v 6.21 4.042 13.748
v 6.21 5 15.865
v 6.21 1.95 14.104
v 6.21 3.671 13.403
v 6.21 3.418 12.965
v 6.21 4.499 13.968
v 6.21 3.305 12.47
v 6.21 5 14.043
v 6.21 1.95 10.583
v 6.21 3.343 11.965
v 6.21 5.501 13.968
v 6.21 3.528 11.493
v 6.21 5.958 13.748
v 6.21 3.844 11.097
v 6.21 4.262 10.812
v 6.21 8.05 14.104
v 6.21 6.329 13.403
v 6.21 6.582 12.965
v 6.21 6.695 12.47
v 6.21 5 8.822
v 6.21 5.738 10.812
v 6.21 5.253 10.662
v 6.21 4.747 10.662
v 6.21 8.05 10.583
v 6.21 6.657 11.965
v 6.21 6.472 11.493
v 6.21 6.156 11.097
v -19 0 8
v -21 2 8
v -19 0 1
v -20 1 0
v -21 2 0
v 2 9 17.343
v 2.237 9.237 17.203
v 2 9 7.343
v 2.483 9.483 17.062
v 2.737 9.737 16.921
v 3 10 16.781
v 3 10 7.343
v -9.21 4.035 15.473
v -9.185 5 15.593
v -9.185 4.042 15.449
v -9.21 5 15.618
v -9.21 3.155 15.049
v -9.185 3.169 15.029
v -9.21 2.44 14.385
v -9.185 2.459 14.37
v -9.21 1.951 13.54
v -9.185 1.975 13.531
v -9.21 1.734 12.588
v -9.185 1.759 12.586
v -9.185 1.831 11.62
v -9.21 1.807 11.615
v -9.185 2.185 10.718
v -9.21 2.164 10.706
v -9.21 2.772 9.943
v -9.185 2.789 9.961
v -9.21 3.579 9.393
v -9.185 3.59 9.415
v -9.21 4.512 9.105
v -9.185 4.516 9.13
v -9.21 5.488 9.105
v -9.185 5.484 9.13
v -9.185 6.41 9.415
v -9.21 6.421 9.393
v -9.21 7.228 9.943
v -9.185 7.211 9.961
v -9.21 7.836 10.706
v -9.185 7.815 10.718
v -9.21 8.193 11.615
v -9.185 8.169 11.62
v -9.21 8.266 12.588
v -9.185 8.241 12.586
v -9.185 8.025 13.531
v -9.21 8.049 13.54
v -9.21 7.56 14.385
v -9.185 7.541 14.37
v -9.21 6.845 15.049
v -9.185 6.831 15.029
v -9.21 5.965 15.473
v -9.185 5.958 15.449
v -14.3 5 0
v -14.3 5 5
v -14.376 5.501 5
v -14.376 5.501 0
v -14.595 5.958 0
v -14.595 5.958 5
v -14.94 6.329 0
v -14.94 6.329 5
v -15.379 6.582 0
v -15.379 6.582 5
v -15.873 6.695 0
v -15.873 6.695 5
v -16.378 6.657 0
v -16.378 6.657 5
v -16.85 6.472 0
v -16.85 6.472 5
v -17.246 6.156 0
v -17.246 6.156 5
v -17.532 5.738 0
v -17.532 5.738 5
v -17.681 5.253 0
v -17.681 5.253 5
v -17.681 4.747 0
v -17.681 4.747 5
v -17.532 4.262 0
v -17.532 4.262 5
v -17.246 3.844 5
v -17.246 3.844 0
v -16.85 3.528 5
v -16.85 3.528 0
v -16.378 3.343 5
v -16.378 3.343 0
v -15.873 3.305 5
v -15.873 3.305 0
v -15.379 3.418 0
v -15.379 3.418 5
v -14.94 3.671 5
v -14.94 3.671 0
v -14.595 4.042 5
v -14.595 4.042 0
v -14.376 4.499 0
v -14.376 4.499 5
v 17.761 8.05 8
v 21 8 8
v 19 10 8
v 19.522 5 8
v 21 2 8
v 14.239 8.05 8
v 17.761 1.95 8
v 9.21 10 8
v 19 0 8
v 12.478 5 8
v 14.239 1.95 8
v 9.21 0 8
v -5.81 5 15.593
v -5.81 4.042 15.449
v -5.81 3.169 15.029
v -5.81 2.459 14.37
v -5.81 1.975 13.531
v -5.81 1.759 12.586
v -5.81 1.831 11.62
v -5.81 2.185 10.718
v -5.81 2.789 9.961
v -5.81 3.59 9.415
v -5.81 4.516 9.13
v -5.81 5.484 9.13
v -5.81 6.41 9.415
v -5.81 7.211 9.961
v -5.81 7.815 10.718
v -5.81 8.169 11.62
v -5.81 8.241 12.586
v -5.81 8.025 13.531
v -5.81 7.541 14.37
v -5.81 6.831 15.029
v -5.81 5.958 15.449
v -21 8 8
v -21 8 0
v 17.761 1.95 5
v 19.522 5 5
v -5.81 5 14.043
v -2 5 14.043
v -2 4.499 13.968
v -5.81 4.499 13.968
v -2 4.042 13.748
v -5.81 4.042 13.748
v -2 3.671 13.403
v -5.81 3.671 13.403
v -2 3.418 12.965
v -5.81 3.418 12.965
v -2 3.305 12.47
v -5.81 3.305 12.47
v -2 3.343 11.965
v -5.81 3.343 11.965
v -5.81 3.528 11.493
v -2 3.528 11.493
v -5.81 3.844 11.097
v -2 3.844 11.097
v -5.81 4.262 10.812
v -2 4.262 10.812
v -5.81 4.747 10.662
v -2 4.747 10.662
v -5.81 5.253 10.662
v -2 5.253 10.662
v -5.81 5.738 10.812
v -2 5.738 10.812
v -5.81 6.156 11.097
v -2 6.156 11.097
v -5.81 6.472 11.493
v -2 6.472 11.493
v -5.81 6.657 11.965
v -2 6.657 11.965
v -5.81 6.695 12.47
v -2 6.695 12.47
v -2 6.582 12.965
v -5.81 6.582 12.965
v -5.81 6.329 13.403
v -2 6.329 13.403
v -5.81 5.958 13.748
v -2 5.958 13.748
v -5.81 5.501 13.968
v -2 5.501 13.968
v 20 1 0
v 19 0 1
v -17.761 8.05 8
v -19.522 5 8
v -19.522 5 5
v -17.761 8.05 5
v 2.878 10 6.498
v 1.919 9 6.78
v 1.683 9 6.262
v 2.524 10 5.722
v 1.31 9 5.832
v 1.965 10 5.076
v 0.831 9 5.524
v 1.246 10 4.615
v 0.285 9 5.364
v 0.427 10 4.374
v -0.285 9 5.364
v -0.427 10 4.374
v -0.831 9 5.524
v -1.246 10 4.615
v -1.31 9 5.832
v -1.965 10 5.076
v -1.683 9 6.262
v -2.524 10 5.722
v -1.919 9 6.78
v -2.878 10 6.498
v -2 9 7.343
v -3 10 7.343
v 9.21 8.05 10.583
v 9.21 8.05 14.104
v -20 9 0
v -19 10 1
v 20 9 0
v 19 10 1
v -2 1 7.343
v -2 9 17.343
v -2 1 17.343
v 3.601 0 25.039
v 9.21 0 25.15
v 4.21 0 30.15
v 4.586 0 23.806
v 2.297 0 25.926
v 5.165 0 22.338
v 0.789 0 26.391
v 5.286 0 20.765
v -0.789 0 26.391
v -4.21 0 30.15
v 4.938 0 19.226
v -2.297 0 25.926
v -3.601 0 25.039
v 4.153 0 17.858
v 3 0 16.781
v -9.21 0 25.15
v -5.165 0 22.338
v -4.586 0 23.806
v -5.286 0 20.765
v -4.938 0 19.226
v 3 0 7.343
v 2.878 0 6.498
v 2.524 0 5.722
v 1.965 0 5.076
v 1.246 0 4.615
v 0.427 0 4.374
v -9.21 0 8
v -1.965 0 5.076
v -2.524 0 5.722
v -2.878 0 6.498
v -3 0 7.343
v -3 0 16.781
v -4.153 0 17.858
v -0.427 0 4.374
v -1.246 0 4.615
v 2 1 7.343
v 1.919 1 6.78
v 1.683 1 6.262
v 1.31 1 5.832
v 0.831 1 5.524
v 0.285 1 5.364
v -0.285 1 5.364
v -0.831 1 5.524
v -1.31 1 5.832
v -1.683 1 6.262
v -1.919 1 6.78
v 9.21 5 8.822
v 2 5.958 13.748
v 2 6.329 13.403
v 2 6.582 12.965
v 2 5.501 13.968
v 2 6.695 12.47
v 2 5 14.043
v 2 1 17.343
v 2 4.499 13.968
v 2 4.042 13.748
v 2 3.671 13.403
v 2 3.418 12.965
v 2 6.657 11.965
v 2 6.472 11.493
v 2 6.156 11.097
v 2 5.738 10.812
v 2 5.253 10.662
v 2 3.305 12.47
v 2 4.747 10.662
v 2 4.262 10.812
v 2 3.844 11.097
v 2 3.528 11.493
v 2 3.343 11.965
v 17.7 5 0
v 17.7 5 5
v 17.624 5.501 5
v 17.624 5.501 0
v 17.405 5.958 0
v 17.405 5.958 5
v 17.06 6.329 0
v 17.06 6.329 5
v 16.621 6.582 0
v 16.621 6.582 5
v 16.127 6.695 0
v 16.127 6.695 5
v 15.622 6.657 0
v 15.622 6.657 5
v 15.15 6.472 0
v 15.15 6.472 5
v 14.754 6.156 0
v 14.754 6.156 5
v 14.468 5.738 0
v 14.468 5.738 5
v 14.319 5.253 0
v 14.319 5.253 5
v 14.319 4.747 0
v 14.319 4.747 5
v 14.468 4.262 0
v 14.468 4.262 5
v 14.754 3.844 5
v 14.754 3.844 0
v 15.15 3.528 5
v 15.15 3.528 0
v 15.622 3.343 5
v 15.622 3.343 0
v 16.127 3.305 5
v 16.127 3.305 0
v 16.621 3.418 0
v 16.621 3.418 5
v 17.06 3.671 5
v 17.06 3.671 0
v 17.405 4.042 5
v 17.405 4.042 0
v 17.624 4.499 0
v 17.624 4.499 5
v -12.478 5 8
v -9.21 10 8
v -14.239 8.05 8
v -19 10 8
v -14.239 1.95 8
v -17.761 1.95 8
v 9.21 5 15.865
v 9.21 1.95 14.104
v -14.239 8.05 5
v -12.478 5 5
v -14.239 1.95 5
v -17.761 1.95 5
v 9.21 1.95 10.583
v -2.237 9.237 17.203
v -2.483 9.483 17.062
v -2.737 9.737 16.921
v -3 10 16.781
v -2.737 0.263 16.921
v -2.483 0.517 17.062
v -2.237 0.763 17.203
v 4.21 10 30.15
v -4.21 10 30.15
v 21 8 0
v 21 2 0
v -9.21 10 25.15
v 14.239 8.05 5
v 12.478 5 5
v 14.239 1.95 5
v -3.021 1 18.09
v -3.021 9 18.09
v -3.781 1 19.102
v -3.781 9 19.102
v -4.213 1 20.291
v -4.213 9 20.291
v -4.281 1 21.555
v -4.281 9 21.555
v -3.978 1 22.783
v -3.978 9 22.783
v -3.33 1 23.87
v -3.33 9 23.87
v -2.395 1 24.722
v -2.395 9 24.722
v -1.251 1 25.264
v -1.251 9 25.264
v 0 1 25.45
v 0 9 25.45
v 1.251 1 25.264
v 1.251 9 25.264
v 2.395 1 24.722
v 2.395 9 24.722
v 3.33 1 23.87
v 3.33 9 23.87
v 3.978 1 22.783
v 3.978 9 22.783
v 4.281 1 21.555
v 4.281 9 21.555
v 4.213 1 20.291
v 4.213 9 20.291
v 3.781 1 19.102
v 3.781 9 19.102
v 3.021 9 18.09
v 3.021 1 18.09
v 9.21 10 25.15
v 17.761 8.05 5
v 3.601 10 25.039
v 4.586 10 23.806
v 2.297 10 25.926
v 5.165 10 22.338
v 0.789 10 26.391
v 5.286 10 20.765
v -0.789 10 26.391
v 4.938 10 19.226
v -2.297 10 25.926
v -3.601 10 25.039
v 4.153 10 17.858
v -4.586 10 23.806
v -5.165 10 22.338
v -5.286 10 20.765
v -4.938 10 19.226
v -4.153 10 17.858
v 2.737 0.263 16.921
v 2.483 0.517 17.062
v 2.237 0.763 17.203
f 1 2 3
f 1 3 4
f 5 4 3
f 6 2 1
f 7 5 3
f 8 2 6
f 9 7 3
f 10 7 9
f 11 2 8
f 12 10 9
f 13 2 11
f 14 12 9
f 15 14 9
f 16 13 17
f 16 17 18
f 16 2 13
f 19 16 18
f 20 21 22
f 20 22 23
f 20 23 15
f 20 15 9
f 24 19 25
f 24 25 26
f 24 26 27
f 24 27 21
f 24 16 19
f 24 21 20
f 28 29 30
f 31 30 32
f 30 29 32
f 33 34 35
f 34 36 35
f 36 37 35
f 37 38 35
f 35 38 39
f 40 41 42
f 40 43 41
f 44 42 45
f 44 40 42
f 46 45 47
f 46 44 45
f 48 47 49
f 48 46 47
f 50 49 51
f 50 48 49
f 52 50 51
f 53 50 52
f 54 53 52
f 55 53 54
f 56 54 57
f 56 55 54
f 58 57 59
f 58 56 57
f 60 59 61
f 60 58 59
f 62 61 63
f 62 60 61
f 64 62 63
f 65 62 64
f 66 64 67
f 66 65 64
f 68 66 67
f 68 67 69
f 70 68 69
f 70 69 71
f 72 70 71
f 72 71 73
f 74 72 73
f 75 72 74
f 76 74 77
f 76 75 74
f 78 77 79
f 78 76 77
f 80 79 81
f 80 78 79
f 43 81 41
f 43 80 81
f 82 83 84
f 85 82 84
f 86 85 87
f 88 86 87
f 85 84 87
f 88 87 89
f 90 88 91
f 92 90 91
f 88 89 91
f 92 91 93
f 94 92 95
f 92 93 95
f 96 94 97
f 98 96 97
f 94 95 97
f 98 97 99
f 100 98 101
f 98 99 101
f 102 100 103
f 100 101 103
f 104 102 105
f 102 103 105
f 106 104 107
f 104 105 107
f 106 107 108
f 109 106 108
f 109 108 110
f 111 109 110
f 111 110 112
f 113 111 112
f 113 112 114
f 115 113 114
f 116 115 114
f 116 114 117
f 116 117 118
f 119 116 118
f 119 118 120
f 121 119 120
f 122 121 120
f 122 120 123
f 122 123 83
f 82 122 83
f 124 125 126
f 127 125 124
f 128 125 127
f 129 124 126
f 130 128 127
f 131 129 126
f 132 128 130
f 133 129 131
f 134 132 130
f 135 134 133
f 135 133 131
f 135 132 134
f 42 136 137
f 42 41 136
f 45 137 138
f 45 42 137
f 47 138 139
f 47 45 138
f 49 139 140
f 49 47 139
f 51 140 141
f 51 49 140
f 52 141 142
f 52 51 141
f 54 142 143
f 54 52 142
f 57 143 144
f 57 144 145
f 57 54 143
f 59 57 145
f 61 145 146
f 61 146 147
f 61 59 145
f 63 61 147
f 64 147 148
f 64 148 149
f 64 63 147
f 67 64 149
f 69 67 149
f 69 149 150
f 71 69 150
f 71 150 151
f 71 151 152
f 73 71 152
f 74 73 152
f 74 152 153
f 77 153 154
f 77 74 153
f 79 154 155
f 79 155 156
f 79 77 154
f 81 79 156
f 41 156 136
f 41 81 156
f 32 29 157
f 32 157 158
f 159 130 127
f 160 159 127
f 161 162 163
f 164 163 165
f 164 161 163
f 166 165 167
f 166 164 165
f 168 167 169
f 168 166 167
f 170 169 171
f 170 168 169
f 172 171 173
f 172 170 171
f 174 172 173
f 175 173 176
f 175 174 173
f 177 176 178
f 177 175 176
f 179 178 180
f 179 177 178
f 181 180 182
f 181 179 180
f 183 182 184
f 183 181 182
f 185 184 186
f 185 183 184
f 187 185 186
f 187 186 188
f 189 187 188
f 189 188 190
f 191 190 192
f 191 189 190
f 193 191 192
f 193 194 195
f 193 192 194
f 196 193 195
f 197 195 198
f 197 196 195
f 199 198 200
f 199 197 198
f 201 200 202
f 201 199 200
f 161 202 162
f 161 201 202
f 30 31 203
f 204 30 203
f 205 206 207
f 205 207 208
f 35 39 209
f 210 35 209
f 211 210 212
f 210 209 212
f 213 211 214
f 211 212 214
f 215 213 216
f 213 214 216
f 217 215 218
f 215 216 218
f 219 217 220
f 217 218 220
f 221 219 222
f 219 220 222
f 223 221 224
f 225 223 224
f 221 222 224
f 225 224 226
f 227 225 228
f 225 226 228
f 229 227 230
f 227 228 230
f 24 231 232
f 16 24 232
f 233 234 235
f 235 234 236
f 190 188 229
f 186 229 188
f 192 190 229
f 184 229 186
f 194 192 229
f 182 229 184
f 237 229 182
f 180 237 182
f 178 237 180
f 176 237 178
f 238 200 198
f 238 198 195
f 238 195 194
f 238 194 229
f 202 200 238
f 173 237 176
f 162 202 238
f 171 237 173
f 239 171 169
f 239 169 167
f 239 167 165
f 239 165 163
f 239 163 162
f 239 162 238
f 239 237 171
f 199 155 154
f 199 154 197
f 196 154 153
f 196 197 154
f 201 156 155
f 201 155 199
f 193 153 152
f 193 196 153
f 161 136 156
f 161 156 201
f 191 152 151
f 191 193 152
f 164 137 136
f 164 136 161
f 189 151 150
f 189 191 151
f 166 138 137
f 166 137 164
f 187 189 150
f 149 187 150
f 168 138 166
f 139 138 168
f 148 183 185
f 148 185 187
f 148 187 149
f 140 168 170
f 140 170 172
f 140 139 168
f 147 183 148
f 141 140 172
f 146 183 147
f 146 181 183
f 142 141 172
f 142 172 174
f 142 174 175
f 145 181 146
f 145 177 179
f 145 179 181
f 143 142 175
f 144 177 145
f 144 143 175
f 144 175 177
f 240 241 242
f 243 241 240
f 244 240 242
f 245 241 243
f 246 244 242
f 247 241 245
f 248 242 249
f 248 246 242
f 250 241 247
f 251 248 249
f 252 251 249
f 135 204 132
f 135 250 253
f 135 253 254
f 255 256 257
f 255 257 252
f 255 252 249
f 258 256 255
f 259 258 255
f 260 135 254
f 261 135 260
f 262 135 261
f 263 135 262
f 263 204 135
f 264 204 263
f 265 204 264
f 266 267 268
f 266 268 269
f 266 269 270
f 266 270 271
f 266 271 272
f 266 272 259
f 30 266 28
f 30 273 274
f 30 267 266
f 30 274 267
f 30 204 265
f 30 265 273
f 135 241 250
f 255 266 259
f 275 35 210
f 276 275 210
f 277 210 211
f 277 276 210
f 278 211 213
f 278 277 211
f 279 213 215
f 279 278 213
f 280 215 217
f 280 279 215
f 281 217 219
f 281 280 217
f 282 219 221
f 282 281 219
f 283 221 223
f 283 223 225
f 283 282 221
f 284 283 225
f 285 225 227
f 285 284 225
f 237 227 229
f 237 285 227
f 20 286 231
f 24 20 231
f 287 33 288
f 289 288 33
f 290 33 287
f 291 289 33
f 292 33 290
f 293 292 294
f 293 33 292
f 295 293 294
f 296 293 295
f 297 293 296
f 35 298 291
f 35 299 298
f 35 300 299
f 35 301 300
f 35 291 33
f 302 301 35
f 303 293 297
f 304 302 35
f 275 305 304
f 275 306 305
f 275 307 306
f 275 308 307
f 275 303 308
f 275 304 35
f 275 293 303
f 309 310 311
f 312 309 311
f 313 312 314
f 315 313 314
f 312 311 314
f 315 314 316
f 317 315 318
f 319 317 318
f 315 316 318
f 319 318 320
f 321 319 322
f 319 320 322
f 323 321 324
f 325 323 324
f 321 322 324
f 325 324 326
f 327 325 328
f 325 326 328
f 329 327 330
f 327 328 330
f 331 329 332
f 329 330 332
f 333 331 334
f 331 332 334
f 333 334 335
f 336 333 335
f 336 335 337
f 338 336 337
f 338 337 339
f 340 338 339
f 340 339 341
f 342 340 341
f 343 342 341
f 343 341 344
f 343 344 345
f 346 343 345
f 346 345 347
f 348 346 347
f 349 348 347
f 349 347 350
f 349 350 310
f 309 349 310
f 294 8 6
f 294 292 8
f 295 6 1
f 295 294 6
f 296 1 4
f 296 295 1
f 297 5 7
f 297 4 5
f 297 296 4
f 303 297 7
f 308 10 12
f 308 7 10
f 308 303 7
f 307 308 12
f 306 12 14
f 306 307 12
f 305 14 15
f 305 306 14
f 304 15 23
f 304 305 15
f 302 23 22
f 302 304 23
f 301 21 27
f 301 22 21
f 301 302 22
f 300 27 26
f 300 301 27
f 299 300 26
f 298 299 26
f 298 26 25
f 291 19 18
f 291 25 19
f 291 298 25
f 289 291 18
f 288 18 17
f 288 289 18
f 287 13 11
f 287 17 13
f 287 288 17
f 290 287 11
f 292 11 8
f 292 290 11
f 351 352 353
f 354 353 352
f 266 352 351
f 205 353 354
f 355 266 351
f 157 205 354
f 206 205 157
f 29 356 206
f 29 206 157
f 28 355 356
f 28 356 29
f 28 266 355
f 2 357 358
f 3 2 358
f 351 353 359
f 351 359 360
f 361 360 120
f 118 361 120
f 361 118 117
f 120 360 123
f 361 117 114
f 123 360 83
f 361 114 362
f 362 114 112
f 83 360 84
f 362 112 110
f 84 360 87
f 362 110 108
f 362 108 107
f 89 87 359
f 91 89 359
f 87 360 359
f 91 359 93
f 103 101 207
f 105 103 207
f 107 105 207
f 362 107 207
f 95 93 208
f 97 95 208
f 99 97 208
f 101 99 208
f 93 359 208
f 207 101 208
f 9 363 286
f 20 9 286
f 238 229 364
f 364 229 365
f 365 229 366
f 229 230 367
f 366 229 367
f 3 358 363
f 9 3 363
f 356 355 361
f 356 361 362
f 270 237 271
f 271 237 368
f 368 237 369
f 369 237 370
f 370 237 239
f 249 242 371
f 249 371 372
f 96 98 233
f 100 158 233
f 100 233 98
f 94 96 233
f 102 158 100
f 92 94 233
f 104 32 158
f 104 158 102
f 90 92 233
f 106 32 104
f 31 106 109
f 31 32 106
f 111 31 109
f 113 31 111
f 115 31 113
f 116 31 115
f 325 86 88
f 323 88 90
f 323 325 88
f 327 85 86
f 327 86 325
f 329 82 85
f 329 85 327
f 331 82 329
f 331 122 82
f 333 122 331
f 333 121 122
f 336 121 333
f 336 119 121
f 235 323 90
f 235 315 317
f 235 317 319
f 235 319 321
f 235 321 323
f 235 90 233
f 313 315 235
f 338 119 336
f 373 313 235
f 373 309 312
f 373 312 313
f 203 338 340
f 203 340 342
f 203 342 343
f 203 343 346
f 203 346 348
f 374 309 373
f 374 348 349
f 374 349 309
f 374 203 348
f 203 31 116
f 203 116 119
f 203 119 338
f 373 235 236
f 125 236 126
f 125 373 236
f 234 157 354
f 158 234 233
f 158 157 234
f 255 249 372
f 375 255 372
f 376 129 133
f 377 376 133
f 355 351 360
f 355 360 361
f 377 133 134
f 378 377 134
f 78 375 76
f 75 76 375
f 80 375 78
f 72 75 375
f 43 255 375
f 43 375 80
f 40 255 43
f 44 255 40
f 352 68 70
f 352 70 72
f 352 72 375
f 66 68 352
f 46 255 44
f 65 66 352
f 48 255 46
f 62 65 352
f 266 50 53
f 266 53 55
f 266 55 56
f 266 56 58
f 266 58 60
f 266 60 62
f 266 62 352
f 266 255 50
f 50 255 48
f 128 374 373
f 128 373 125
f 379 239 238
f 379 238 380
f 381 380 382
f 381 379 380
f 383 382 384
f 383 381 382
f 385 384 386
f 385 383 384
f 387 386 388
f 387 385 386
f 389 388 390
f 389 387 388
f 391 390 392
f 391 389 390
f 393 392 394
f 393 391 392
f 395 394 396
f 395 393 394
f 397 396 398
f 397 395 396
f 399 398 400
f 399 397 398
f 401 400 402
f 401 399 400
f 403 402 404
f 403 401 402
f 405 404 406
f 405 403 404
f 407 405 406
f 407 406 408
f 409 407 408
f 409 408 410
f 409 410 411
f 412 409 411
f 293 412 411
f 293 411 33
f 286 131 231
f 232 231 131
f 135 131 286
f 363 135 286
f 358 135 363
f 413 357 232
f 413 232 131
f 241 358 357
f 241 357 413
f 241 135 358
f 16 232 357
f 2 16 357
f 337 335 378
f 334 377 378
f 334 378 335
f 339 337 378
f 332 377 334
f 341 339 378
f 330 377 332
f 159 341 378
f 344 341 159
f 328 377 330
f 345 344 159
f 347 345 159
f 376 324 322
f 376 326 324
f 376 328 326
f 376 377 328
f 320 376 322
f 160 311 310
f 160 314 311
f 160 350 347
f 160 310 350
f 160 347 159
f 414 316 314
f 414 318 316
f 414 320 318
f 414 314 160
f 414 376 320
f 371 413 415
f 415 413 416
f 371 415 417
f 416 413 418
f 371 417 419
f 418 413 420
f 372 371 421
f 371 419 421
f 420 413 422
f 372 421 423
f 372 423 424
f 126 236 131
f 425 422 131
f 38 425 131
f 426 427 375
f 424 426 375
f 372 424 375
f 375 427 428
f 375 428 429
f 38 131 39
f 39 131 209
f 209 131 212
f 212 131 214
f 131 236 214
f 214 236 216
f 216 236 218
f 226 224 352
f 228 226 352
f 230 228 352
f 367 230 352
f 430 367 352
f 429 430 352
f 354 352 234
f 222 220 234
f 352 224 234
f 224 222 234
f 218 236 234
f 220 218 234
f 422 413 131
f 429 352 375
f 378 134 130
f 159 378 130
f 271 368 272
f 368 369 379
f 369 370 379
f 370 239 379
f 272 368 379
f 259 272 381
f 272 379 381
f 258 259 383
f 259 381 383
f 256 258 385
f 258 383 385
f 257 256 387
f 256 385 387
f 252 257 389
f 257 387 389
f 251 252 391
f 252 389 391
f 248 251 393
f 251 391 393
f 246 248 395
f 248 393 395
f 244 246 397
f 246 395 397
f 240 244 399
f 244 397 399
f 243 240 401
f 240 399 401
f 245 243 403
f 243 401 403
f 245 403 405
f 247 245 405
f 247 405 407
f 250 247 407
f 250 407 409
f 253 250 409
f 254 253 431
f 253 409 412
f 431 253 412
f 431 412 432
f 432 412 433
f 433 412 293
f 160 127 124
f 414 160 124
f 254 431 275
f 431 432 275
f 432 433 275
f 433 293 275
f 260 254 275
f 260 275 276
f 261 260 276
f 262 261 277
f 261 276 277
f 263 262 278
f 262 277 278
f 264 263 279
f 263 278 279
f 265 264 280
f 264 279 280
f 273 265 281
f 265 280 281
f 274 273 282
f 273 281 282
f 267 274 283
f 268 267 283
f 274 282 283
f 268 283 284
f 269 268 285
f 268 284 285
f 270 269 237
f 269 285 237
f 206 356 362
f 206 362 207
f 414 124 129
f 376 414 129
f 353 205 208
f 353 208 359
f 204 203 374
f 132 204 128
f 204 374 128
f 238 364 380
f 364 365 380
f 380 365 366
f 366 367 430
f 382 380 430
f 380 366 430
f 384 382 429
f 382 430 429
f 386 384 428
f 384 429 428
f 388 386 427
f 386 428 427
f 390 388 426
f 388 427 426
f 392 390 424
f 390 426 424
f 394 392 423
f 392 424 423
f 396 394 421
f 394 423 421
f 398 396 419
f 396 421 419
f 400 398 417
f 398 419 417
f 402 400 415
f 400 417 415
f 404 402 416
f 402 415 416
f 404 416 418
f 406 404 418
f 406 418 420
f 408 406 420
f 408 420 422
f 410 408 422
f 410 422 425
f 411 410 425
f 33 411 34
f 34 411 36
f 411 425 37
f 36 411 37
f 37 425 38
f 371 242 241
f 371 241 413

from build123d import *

# Parameters (mm, degrees)
BOSS_EXTRUDE1_DEPTH  = 10
CHAMFER1_SIZE        = 5
CHAMFER2_SIZE        = 2
CHAMFER3_SIZE        = 1
CUT_EXTRUDE1_DEPTH   = 3
M3_CLEARANCE_HOLE1_D = 3.4
CUT_EXTRUDE2_DEPTH   = 3


with BuildPart() as part:
    # Sketch1 → Boss-Extrude1 (new body)
    with BuildSketch(Plane(origin=(0, 0, 0), x_dir=(1, 0, 0), z_dir=(0, 1, 0))):
        Polygon((-21, 0), (21, 0), (21, -8), (9.21, -8), (9.21, -30.15), (-9.21, -30.15), (-9.21, -8), (-21, -8), align=None)
        with BuildLine():
            Line((-2, -7.343426738), (-2, -17.343426738))
            ThreePointArc((-2, -17.343426738), (0, -25.45), (2, -17.343426738))
            Line((2, -17.343426738), (2, -7.343426738))
            ThreePointArc((2, -7.343426738), (0, -5.343426738), (-2, -7.343426738))
        make_face(mode=Mode.SUBTRACT)
    extrude(amount=BOSS_EXTRUDE1_DEPTH)

    # Chamfer1
    chamfer1_edges = [part.edges().sort_by_distance(p)[0] for p in [
        (9.21, 5, 30.15),
        (-9.21, 5, 30.15),
    ]]
    chamfer(chamfer1_edges, length=CHAMFER1_SIZE)

    # Chamfer2
    chamfer2_edges = [part.edges().sort_by_distance(p)[0] for p in [
        (-21, 0, 4),
        (21, 10, 4),
        (-21, 10, 4),
        (21, 0, 4),
    ]]
    chamfer(chamfer2_edges, length=CHAMFER2_SIZE)

    # Chamfer3
    chamfer3_edges = [part.edges().sort_by_distance(p)[0] for p in [
        (0, 0, 5.343426738),
        (-2, 0, 12.343426738),
        (0, 0, 25.45),
        (2, 0, 12.343426738),
        (0, 10, 5.343426738),
        (-2, 10, 12.343426738),
        (0, 10, 25.45),
        (2, 10, 12.343426738),
        (0, 0, 0),
        (0, 10, 0),
    ]]
    chamfer(chamfer3_edges, length=CHAMFER3_SIZE)

    # Sketch2 → Cut-Extrude1 (cut)
    with BuildSketch(Plane(origin=(9.21, 0, 0), x_dir=(0, 0, -1), z_dir=(1, 0, 0))):
        Polygon((-10.582508417, 1.95), (-8.821590096, 5), (-10.582508417, 8.05), (-14.104345059, 8.05), (-15.86526338, 5), (-14.104345059, 1.95), align=None)
    extrude(amount=-CUT_EXTRUDE1_DEPTH, mode=Mode.SUBTRACT)

    # Sketch6 → CBORE for M3 Hex Socket Head Cap Screw1 (revolve, cut)
    with BuildSketch(Plane(origin=(-9.21, 5, 12.343426738), x_dir=(0, 0, 1), z_dir=(0, 1, 0))):
        Polygon((0, 0), (0, 30.21), (1.7, 30.21), (1.7, 3.4), (3.25, 3.4), (3.25, 0.025), (3.275, 0), align=None)
    revolve(axis=Axis((-15.56, 5, 12.343426738), (1, 0, 0)), mode=Mode.SUBTRACT)

    # M3 Clearance Hole1 (through all)
    with Locations(Plane(origin=(0, 0, 0), x_dir=(-1, 0, 0), z_dir=(0, 0, -1))):
        with Locations((16, 5), (-16, 5)):
            Hole(M3_CLEARANCE_HOLE1_D / 2)

    # Sketch9 → Cut-Extrude2 (cut)
    with BuildSketch(Plane(origin=(0, 0, 8), x_dir=(-1, 0, 0), z_dir=(0, 0, -1))):
        Polygon((17.760918321, 1.95), (19.521836642, 5), (17.760918321, 8.05), (14.239081679, 8.05), (12.478163358, 5), (14.239081679, 1.95), align=None)
        Polygon((-14.239081679, 1.95), (-17.760918321, 1.95), (-19.521836642, 5), (-17.760918321, 8.05), (-14.239081679, 8.05), (-12.478163358, 5), align=None)
    extrude(amount=CUT_EXTRUDE2_DEPTH, mode=Mode.SUBTRACT)


solid = part.part
